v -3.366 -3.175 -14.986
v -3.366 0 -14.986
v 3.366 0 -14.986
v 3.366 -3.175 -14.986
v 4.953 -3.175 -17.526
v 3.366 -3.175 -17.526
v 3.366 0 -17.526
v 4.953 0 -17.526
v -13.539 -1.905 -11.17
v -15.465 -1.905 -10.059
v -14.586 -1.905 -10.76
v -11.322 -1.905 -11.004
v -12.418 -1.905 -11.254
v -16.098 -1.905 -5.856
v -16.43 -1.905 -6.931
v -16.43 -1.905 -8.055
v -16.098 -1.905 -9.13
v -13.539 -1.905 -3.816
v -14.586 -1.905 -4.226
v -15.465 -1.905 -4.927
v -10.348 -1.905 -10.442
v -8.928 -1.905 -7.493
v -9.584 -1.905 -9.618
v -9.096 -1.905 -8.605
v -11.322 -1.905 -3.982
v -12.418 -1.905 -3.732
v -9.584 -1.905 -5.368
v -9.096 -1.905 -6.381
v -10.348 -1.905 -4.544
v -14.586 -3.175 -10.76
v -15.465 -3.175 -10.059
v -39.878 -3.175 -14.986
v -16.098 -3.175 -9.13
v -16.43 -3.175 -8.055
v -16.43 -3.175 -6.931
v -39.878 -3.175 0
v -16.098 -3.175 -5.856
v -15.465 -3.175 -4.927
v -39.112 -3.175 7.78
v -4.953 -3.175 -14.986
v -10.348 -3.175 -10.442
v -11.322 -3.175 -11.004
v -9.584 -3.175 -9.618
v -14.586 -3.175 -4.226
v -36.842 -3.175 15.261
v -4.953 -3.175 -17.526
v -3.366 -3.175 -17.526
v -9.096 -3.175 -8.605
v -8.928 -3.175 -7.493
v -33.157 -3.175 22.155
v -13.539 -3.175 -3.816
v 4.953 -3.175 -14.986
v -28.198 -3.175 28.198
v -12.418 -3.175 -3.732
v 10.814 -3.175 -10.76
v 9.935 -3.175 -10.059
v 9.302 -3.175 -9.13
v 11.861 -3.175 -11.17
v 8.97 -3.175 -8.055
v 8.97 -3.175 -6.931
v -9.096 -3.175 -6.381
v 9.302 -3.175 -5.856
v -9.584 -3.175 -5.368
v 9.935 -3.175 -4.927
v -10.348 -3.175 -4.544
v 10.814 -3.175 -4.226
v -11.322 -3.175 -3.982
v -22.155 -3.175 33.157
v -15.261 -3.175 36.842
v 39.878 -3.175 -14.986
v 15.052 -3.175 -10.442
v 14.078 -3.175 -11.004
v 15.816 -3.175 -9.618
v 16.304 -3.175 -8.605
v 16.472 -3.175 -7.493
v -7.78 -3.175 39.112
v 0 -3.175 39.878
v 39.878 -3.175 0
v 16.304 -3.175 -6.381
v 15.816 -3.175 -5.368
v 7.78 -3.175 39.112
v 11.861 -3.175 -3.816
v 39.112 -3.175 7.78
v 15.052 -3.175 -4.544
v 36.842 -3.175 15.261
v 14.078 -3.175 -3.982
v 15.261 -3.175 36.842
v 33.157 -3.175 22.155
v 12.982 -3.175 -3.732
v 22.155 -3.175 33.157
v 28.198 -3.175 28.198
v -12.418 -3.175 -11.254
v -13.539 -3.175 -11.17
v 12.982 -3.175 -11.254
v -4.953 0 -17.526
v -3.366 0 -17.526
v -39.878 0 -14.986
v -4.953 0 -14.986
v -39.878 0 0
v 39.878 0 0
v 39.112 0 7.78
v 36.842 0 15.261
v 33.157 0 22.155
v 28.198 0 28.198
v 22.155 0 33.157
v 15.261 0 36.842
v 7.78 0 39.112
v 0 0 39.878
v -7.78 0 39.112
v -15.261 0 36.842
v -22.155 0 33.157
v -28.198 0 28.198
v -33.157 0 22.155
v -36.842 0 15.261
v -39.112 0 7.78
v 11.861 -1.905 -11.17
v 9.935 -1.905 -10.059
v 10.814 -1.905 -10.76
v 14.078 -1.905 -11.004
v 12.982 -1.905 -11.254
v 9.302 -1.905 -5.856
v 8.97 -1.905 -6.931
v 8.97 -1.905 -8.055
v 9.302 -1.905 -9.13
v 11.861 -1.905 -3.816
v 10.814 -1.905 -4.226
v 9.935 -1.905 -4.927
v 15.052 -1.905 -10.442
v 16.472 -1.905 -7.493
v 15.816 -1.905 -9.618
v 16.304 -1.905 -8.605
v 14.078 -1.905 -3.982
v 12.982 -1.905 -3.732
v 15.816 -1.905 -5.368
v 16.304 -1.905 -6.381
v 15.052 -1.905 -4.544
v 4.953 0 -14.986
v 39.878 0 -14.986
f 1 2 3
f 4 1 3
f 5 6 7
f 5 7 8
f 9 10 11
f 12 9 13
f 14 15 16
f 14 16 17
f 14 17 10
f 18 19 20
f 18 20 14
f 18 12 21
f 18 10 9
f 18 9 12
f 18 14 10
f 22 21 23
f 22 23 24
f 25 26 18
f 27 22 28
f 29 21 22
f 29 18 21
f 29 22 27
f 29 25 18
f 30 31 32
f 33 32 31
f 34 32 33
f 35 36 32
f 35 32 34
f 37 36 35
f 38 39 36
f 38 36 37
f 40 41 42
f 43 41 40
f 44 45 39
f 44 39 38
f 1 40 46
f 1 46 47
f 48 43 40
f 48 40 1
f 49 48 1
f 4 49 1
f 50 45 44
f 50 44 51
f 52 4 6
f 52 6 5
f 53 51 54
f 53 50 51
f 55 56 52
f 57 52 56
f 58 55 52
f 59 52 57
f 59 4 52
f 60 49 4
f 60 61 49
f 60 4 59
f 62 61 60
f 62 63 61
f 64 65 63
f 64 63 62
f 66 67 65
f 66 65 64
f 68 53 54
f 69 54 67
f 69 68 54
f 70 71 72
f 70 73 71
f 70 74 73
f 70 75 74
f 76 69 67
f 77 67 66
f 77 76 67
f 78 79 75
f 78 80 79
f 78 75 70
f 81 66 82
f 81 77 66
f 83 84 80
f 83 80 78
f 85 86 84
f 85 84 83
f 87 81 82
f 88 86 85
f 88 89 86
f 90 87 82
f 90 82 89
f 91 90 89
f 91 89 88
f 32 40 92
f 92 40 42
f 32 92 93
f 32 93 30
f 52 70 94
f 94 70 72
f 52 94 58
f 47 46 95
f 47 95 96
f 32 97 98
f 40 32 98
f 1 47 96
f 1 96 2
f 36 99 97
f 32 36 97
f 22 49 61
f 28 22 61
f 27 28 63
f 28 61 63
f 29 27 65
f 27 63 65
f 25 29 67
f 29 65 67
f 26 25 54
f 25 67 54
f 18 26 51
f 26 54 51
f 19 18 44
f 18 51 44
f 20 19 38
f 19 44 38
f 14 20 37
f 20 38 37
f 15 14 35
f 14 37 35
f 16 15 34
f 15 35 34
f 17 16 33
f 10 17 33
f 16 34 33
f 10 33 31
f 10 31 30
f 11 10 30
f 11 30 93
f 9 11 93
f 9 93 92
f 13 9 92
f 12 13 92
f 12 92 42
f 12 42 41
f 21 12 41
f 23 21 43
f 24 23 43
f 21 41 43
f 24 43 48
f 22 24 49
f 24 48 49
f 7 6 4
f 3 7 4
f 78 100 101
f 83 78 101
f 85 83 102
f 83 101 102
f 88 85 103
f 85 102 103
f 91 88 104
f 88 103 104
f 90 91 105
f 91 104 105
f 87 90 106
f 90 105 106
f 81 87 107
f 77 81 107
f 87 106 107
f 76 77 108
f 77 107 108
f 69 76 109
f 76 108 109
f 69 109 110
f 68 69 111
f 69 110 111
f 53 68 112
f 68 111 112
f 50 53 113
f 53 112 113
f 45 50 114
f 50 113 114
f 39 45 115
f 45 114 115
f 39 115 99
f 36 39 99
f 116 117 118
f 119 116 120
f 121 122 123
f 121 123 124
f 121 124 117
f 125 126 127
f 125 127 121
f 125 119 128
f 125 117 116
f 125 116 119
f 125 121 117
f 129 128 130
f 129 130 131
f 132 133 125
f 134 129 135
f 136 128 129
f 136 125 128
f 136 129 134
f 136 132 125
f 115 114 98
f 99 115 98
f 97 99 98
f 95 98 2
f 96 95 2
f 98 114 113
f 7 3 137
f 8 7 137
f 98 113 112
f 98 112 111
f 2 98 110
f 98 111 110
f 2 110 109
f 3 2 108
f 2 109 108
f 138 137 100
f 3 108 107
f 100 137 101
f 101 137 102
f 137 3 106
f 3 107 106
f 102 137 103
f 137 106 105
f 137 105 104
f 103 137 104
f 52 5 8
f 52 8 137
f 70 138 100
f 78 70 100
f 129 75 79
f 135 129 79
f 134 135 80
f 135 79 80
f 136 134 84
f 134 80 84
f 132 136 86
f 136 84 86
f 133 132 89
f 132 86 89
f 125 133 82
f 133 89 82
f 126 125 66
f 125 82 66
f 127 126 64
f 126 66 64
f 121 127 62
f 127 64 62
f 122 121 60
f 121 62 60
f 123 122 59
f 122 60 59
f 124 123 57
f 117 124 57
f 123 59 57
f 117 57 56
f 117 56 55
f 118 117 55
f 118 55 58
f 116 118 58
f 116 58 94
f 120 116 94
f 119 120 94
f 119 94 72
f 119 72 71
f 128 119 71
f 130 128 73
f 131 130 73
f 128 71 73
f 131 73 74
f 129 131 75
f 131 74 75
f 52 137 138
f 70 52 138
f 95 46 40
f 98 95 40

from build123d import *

# Parameters (mm, degrees)
F1_DEPTH = 3.175
F2_R     = 3.7719
F3_DEPTH = 1.27
F4_W     = 1.5875
F4_H     = 2.54
F5_DEPTH = 3.175


with BuildPart() as f1:
    # F0 (on Front) → F1 (new body)
    with BuildSketch(Plane.XZ):
        with BuildLine():
            ThreePointArc((39.878, 0), (0, 39.878), (-39.878, 0))
            Line((-39.878, 0), (-39.878, -14.986))
            Line((-39.878, -14.986), (39.878, -14.986))
            Line((39.878, -14.986), (39.878, 0))
        make_face()
    extrude(amount=F1_DEPTH)

    # F2 (on face) → F3 (cut)
    with BuildSketch(Plane.XZ.offset(3.175)):
        with Locations((-12.7, -7.493)):
            Circle(F2_R)
        with Locations((12.7, -7.493)):
            Circle(F2_R)
    extrude(amount=-F3_DEPTH, mode=Mode.SUBTRACT)

    # F4 (on face) → F5 (join)
    with BuildSketch(Plane.XZ.offset(3.175)):
        with Locations((-4.15925, -16.256)):
            Rectangle(F4_W, F4_H)
        with Locations((4.15925, -16.256)):
            Rectangle(F4_W, F4_H)
    extrude(amount=-F5_DEPTH)


solid = f1.part
